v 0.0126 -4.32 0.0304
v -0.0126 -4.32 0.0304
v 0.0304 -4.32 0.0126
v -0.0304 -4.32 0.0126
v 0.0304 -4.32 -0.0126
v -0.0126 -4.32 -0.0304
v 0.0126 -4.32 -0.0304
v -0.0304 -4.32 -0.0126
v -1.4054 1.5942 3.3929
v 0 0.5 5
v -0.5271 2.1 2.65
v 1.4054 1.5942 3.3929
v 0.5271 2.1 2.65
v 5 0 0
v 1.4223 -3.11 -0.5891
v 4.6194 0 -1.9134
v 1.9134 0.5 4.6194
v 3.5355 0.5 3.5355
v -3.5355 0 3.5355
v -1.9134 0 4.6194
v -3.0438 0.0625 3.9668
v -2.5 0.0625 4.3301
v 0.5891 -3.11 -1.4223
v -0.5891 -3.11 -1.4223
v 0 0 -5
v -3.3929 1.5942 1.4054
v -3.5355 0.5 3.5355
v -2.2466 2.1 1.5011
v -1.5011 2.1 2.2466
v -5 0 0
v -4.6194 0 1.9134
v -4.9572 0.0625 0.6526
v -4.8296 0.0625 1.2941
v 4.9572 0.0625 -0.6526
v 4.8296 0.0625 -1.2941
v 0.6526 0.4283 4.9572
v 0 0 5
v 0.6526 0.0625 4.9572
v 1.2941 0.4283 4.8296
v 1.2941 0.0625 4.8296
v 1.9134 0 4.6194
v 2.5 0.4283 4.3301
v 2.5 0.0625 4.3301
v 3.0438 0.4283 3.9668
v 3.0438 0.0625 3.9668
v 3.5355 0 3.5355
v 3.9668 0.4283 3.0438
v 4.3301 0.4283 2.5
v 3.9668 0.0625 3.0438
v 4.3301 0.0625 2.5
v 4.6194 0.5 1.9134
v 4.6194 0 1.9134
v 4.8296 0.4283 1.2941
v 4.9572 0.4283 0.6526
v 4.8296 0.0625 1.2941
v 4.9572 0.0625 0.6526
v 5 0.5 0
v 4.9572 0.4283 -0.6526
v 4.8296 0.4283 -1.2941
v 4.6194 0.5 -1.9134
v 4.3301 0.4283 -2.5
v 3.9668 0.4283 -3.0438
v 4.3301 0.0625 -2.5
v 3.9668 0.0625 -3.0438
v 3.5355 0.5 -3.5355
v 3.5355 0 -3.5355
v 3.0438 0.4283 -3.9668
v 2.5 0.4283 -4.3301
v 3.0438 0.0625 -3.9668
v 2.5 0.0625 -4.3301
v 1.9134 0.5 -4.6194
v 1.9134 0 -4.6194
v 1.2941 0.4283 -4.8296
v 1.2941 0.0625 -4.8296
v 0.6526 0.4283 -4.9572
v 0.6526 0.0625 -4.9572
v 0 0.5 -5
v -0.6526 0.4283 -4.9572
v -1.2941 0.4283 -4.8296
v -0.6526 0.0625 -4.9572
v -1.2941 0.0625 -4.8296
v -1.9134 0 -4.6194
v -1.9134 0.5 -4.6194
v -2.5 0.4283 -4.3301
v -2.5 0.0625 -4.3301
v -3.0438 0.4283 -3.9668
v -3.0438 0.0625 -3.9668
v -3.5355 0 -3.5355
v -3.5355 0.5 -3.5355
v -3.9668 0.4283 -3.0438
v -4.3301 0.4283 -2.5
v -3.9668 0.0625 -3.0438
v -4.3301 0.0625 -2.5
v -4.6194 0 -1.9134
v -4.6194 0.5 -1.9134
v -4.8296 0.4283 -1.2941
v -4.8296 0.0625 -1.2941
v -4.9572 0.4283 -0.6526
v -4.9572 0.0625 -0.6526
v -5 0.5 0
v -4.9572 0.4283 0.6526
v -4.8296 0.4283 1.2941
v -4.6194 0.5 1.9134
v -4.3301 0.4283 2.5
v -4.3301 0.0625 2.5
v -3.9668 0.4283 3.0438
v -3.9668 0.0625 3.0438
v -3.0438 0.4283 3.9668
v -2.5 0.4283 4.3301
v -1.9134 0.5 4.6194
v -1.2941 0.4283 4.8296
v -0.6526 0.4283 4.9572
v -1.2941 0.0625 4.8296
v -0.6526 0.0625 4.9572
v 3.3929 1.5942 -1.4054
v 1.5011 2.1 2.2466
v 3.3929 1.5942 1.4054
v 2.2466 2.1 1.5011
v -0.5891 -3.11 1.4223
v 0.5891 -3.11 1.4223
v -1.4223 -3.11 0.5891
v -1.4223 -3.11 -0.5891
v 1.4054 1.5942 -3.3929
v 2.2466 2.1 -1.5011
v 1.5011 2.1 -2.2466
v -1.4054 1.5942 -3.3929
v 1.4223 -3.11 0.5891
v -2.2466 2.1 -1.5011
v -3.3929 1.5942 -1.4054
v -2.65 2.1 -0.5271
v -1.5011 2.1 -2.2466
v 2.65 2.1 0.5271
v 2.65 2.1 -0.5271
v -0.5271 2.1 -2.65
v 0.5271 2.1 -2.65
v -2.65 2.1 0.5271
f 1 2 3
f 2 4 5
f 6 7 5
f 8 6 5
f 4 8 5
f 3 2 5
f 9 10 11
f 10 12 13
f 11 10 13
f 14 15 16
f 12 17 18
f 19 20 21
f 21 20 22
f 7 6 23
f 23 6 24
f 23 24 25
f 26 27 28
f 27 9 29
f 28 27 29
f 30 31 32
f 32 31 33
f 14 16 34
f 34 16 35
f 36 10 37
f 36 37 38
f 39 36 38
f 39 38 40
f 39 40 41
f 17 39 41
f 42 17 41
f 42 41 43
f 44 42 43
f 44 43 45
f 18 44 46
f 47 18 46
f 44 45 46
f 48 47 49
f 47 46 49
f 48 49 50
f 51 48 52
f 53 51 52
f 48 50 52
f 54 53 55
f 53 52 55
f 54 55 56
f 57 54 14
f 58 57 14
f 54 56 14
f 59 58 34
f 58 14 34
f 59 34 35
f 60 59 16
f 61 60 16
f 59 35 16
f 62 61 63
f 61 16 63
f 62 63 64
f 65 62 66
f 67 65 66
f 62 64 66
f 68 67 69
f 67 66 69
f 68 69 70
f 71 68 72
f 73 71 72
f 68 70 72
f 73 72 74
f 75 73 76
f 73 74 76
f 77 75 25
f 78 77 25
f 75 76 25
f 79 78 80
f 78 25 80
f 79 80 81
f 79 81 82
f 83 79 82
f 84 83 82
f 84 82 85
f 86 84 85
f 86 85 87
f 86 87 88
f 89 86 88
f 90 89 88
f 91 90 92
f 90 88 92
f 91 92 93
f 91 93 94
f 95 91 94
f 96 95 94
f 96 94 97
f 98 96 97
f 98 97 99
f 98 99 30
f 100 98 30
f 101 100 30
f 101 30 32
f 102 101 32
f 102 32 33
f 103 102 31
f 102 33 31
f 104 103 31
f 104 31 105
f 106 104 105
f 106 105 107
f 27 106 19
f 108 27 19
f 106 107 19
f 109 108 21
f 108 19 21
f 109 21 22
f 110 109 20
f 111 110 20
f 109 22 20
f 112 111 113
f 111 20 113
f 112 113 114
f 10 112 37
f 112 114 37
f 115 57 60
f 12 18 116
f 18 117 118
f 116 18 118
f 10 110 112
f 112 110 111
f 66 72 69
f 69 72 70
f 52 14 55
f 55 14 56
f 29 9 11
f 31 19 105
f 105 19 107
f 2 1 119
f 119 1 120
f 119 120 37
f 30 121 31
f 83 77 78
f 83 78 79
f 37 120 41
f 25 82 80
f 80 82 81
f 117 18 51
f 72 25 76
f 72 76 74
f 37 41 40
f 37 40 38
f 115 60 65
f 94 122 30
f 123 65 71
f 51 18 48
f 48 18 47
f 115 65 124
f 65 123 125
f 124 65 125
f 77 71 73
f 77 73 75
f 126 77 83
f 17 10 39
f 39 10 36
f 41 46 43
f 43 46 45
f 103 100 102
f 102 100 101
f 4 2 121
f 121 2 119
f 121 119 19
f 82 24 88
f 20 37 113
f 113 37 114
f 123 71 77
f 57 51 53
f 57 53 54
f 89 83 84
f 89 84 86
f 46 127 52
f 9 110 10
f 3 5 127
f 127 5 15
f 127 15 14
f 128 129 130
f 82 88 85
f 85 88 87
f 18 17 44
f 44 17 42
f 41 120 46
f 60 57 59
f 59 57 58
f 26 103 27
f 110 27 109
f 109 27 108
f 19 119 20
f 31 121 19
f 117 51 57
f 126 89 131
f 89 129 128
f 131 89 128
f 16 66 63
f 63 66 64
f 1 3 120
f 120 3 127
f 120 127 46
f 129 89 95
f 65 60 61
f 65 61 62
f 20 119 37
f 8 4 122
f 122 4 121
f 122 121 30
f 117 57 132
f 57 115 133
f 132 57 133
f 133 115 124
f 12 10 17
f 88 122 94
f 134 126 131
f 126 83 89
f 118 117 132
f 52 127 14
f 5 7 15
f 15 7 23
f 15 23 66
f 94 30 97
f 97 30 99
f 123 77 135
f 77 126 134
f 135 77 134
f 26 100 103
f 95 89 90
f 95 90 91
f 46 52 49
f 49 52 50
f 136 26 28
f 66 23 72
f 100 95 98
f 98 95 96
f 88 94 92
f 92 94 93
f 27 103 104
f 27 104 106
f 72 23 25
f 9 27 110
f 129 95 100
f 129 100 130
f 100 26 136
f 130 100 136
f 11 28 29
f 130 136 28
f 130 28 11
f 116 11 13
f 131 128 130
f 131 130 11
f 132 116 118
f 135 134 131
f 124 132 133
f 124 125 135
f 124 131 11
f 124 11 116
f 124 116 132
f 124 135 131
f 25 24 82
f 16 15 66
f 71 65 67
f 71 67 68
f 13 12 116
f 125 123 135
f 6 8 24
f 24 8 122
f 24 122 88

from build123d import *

# Parameters (mm, degrees)
ESQUISSE1_R                  = 5
BOSS_EXTRU_4_DEPTH           = 0.5
BOSS_EXTRU_5_DEPTH           = 4.32
BOSS_EXTRU_6_DEPTH           = 1.6
ENL_V_MAT_EXTRU_1_DEPTH      = 6
R_P_TITION_CIRCULAIRE1_COUNT = 8
ENL_V_MAT_EXTRU_4_DEPTH      = 7.935199227
R_P_TITION_CIRCULAIRE2_COUNT = 16
ENL_V_MAT_EXTRU_5_DEPTH      = 7.532814824
R_P_TITION_CIRCULAIRE3_COUNT = 8


with BuildPart() as part:
    # Esquisse1 → Boss.-Extru.4 (new body)
    with BuildSketch(Plane(origin=(0, 0, 0), x_dir=(1, 0, 0), z_dir=(0, 1, 0))):
        with Locations(Location((0, 0, 0), (0, 0, 270))):  # turned: the seam where the file's is
            Circle(ESQUISSE1_R)
    extrude(amount=BOSS_EXTRU_4_DEPTH)

    # Esquisse1_4 → Boss.-Extru.5 (add)
    with BuildSketch(Plane(origin=(0, 0, 0), x_dir=(1, 0, 0), z_dir=(0, 1, 0))):
        Polygon((2.832272487, -4.238795325), (4.238795325, -2.832272487), (5, -0.994561837), (5, 0.994561837), (4.238795325, 2.832272487), (2.832272487, 4.238795325), (0.994561837, 5), (-0.994561837, 5), (-2.832272487, 4.238795325), (-4.238795325, 2.832272487), (-5, 0.994561837), (-5, -0.994561837), (-4.238795325, -2.832272487), (-2.832272487, -4.238795325), (-0.994561837, -5), (0.994561837, -5), align=None)
    extrude(amount=-BOSS_EXTRU_5_DEPTH)

    # Esquisse11 → Boss.-Extru.6 (add)
    with BuildSketch(Plane(origin=(0, 0.5, 0), x_dir=(1, 0, 0), z_dir=(0, 1, 0))):
        Polygon((-0.994561837, 5), (-2.832272487, 4.238795325), (-4.238795325, 2.832272487), (-5, 0.994561837), (-5, -0.994561837), (-4.238795325, -2.832272487), (-2.832272487, -4.238795325), (-0.994561837, -5), (0.994561837, -5), (2.832272487, -4.238795325), (4.238795325, -2.832272487), (5, -0.994561837), (5, 0.994561837), (4.238795325, 2.832272487), (2.832272487, 4.238795325), (0.994561837, 5), align=None)
    extrude(amount=BOSS_EXTRU_6_DEPTH)

    # Esquisse7 → Enl_v. mat.-Extru.1 (cut, symmetric)
    with BuildSketch(Plane.XY):
        Polygon((-7, 0), (-7, -4.32), (-0.030408481, -4.32), (-5, 0), (-5, 0.5), (-2.65, 2.1), (-7, 2.1), align=None)
    enl_v_mat_extru_1 = extrude(amount=ENL_V_MAT_EXTRU_1_DEPTH, both=True, mode=Mode.SUBTRACT)

    # R_p_tition circulaire1: Enl_v. mat.-Extru.1 ×8 about axis
    r_p_tition_circulaire1_axis = Axis((0, 0, 0), (0, 1, 0))
    for i in range(1, R_P_TITION_CIRCULAIRE1_COUNT):
        add(enl_v_mat_extru_1.rotate(r_p_tition_circulaire1_axis, i * 360 / R_P_TITION_CIRCULAIRE1_COUNT), mode=Mode.SUBTRACT)

    # Esquisse10 → Enl_v. mat.-Extru.4 (cut, symmetric)
    with BuildSketch(Plane(origin=(0, 0, 0), x_dir=(-0.831469612, 0, -0.555570233), z_dir=(0.555570233, 0, -0.831469612))):
        Polygon((5.903926402, 0), (5.903926402, -4.86712571), (-0.407609261, -4.86712571), (4.903926402, 0), (5.221818983, 0.232853051), (4.903926402, 0.5), (3, 2.1), (5.903926402, 2.1), align=None)
    enl_v_mat_extru_4 = extrude(amount=ENL_V_MAT_EXTRU_4_DEPTH, both=True, mode=Mode.SUBTRACT)

    # R_p_tition circulaire2: Enl_v. mat.-Extru.4 ×16 about axis
    r_p_tition_circulaire2_axis = Axis((0, 0, 0), (0, 1, 0))
    for i in range(1, R_P_TITION_CIRCULAIRE2_COUNT):
        add(enl_v_mat_extru_4.rotate(r_p_tition_circulaire2_axis, i * 360 / R_P_TITION_CIRCULAIRE2_COUNT), mode=Mode.SUBTRACT)

    # Esquisse13 → Enl_v. mat.-Extru.5 (cut, symmetric)
    with BuildSketch(Plane(origin=(0, 0, 0), x_dir=(-0.923879533, 0, -0.382683432), z_dir=(0.382683432, 0, -0.923879533))):
        Polygon((3.672450086, 1.594194745), (2.65, 2.1), (3.922671549, 2.1), align=None)
        Polygon((-3.922671549, 2.1), (-3.672450086, 1.594194745), (-2.65, 2.1), align=None)
    enl_v_mat_extru_5 = extrude(amount=ENL_V_MAT_EXTRU_5_DEPTH, both=True, mode=Mode.SUBTRACT)

    # R_p_tition circulaire3: Enl_v. mat.-Extru.5 ×8 about axis
    r_p_tition_circulaire3_axis = Axis((0, 0, 0), (0, 1, 0))
    for i in range(1, R_P_TITION_CIRCULAIRE3_COUNT):
        add(enl_v_mat_extru_5.rotate(r_p_tition_circulaire3_axis, i * 360 / R_P_TITION_CIRCULAIRE3_COUNT), mode=Mode.SUBTRACT)


solid = part.part
